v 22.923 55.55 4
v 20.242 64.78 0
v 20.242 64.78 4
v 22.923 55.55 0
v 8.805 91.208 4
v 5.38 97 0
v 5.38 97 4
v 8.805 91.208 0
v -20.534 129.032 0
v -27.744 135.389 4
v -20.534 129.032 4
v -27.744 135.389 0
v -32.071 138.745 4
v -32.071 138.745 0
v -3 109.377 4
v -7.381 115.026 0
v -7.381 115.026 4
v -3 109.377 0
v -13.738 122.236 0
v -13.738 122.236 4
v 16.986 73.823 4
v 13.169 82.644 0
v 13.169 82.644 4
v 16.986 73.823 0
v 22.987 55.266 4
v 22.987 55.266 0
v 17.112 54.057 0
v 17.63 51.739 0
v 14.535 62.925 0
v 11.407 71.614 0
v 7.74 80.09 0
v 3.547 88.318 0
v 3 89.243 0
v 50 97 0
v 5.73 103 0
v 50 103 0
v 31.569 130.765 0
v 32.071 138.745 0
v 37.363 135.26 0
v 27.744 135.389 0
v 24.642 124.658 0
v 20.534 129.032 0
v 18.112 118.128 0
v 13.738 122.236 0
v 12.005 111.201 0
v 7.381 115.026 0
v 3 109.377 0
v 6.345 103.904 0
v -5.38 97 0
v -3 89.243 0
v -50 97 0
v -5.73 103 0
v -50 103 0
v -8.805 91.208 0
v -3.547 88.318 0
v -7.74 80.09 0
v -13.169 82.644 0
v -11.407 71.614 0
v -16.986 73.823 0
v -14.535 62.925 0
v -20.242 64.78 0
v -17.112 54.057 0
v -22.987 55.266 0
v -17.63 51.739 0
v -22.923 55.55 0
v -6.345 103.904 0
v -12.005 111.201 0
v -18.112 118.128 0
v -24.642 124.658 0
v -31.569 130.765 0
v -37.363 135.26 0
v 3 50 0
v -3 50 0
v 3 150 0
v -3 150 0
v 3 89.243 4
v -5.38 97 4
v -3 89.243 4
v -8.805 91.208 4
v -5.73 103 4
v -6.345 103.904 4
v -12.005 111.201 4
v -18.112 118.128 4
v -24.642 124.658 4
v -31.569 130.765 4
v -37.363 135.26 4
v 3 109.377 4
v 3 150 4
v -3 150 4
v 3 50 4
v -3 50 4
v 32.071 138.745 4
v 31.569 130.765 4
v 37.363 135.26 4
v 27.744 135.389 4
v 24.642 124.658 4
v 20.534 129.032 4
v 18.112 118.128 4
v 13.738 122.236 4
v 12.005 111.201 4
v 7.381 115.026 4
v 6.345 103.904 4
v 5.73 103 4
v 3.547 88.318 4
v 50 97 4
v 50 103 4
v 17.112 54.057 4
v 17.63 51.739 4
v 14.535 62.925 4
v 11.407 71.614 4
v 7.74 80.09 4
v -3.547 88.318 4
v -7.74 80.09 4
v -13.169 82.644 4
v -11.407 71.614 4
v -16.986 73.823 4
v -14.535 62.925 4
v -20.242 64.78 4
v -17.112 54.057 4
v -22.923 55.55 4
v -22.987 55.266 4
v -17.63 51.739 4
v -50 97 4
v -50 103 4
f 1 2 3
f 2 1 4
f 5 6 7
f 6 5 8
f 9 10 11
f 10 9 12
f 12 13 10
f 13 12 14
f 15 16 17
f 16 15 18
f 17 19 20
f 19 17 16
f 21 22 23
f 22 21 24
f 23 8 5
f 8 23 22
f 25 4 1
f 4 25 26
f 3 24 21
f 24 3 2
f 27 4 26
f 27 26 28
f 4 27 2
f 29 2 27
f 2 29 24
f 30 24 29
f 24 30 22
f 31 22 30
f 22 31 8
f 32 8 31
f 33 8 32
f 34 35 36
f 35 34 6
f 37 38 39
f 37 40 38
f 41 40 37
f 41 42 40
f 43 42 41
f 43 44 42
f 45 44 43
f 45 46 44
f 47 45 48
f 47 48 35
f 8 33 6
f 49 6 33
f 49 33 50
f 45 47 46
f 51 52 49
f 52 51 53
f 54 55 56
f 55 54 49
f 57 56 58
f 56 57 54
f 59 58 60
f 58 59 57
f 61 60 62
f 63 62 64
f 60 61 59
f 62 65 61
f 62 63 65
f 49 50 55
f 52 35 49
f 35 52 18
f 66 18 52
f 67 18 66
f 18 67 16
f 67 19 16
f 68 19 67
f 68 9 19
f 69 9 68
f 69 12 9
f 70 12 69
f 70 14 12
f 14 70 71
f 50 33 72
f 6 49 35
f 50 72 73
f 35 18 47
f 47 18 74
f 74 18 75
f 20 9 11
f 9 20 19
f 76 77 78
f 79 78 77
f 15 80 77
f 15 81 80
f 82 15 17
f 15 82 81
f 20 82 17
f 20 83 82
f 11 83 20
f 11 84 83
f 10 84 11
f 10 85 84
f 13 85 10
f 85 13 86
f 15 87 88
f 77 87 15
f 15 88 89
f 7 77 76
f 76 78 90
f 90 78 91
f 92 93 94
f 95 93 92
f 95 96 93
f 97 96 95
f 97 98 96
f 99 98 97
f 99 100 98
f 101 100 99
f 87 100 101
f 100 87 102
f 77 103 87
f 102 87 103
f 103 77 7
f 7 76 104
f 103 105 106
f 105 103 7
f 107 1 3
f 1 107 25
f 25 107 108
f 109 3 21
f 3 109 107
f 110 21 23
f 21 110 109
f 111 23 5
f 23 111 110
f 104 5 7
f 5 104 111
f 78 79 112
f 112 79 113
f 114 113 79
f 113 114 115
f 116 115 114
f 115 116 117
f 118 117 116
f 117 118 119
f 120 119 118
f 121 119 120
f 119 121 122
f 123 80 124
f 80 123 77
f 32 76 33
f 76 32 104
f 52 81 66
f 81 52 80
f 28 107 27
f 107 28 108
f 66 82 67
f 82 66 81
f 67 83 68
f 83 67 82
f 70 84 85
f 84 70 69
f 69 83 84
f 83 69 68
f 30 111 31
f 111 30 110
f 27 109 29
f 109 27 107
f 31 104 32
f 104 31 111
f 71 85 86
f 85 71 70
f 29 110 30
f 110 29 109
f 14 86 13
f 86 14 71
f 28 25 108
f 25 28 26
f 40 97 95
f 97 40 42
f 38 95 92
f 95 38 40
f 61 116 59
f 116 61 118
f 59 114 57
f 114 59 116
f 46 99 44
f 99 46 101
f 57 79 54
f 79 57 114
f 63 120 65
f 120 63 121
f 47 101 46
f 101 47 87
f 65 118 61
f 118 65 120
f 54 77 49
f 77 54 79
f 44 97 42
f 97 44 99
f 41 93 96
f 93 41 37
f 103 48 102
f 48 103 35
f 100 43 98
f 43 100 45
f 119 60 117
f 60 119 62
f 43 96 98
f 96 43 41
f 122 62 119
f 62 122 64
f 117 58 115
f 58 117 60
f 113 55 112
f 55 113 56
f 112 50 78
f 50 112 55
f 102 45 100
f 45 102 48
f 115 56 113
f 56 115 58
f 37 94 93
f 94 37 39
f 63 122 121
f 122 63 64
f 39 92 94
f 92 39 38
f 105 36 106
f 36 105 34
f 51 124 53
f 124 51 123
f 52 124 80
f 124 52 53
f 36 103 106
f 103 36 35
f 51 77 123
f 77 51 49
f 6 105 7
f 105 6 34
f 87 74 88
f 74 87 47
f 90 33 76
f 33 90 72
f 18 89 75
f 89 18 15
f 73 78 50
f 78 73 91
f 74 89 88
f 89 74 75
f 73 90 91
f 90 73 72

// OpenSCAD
// Morgan SCARA Calibration phantom

use <Write.scad>;

Linkage = 150;	//	Arm segment nominal length (as programmed in Firmware)

xoffset = -35;	// Scara tower offset
yoffset = -65;

K1 = 0;
K2 = 0;

theta = 0;
psi = 0;

xpos = 125.27;
ypos = 82.5;

cal_angle = 33.367;

arm_width = 6;
arm_height = 4;



//projection(cut = false)
	SCARAcal();

$fn=100;

module SCARAcal(){


	intersection(){
		translate([-xpos,ypos+yoffset,0])
			difference(){
				cylinder(r=Linkage + 3, h=arm_height);
				cylinder(r=Linkage - 3, h=arm_height);
	
			}
		translate([-xpos,ypos+yoffset,0])
		rotate([0,0,cal_angle])
			translate([100,-50,0])
				cube([100,100,arm_height]);
	}

	intersection(){
		translate([xpos,ypos+yoffset,0])
			difference(){
				cylinder(r=Linkage + arm_width/2, h=arm_height);
				cylinder(r=Linkage - arm_width/2, h=arm_height);
	
			}
		translate([xpos,ypos+yoffset,0])
		rotate([0,0,180-cal_angle])
			translate([100,-50,0])
				cube([100,100,arm_height]);
	}

	translate([0,100,arm_height/2]){
		cube([100,arm_width,arm_height],center=true);
		cube([arm_width,100,arm_height],center=true);
	}

	translate([16,70,arm_height])
		#write("Theta",t=2,h=7,rotate=72,center=true);

	translate([-16,70,arm_height])
		#write("Psi",t=2,h=7,rotate=-72,center=true);

	translate([0,130,arm_height])
		#write("Y",t=2,h=7,rotate=0,center=true);

	translate([-30,100,arm_height])
		#write("X",t=2,h=7,rotate=90,center=true);

	translate([0,101,arm_height])
		#write("Morgan",t=2,h=7,rotate=0,center=true);
	
}
